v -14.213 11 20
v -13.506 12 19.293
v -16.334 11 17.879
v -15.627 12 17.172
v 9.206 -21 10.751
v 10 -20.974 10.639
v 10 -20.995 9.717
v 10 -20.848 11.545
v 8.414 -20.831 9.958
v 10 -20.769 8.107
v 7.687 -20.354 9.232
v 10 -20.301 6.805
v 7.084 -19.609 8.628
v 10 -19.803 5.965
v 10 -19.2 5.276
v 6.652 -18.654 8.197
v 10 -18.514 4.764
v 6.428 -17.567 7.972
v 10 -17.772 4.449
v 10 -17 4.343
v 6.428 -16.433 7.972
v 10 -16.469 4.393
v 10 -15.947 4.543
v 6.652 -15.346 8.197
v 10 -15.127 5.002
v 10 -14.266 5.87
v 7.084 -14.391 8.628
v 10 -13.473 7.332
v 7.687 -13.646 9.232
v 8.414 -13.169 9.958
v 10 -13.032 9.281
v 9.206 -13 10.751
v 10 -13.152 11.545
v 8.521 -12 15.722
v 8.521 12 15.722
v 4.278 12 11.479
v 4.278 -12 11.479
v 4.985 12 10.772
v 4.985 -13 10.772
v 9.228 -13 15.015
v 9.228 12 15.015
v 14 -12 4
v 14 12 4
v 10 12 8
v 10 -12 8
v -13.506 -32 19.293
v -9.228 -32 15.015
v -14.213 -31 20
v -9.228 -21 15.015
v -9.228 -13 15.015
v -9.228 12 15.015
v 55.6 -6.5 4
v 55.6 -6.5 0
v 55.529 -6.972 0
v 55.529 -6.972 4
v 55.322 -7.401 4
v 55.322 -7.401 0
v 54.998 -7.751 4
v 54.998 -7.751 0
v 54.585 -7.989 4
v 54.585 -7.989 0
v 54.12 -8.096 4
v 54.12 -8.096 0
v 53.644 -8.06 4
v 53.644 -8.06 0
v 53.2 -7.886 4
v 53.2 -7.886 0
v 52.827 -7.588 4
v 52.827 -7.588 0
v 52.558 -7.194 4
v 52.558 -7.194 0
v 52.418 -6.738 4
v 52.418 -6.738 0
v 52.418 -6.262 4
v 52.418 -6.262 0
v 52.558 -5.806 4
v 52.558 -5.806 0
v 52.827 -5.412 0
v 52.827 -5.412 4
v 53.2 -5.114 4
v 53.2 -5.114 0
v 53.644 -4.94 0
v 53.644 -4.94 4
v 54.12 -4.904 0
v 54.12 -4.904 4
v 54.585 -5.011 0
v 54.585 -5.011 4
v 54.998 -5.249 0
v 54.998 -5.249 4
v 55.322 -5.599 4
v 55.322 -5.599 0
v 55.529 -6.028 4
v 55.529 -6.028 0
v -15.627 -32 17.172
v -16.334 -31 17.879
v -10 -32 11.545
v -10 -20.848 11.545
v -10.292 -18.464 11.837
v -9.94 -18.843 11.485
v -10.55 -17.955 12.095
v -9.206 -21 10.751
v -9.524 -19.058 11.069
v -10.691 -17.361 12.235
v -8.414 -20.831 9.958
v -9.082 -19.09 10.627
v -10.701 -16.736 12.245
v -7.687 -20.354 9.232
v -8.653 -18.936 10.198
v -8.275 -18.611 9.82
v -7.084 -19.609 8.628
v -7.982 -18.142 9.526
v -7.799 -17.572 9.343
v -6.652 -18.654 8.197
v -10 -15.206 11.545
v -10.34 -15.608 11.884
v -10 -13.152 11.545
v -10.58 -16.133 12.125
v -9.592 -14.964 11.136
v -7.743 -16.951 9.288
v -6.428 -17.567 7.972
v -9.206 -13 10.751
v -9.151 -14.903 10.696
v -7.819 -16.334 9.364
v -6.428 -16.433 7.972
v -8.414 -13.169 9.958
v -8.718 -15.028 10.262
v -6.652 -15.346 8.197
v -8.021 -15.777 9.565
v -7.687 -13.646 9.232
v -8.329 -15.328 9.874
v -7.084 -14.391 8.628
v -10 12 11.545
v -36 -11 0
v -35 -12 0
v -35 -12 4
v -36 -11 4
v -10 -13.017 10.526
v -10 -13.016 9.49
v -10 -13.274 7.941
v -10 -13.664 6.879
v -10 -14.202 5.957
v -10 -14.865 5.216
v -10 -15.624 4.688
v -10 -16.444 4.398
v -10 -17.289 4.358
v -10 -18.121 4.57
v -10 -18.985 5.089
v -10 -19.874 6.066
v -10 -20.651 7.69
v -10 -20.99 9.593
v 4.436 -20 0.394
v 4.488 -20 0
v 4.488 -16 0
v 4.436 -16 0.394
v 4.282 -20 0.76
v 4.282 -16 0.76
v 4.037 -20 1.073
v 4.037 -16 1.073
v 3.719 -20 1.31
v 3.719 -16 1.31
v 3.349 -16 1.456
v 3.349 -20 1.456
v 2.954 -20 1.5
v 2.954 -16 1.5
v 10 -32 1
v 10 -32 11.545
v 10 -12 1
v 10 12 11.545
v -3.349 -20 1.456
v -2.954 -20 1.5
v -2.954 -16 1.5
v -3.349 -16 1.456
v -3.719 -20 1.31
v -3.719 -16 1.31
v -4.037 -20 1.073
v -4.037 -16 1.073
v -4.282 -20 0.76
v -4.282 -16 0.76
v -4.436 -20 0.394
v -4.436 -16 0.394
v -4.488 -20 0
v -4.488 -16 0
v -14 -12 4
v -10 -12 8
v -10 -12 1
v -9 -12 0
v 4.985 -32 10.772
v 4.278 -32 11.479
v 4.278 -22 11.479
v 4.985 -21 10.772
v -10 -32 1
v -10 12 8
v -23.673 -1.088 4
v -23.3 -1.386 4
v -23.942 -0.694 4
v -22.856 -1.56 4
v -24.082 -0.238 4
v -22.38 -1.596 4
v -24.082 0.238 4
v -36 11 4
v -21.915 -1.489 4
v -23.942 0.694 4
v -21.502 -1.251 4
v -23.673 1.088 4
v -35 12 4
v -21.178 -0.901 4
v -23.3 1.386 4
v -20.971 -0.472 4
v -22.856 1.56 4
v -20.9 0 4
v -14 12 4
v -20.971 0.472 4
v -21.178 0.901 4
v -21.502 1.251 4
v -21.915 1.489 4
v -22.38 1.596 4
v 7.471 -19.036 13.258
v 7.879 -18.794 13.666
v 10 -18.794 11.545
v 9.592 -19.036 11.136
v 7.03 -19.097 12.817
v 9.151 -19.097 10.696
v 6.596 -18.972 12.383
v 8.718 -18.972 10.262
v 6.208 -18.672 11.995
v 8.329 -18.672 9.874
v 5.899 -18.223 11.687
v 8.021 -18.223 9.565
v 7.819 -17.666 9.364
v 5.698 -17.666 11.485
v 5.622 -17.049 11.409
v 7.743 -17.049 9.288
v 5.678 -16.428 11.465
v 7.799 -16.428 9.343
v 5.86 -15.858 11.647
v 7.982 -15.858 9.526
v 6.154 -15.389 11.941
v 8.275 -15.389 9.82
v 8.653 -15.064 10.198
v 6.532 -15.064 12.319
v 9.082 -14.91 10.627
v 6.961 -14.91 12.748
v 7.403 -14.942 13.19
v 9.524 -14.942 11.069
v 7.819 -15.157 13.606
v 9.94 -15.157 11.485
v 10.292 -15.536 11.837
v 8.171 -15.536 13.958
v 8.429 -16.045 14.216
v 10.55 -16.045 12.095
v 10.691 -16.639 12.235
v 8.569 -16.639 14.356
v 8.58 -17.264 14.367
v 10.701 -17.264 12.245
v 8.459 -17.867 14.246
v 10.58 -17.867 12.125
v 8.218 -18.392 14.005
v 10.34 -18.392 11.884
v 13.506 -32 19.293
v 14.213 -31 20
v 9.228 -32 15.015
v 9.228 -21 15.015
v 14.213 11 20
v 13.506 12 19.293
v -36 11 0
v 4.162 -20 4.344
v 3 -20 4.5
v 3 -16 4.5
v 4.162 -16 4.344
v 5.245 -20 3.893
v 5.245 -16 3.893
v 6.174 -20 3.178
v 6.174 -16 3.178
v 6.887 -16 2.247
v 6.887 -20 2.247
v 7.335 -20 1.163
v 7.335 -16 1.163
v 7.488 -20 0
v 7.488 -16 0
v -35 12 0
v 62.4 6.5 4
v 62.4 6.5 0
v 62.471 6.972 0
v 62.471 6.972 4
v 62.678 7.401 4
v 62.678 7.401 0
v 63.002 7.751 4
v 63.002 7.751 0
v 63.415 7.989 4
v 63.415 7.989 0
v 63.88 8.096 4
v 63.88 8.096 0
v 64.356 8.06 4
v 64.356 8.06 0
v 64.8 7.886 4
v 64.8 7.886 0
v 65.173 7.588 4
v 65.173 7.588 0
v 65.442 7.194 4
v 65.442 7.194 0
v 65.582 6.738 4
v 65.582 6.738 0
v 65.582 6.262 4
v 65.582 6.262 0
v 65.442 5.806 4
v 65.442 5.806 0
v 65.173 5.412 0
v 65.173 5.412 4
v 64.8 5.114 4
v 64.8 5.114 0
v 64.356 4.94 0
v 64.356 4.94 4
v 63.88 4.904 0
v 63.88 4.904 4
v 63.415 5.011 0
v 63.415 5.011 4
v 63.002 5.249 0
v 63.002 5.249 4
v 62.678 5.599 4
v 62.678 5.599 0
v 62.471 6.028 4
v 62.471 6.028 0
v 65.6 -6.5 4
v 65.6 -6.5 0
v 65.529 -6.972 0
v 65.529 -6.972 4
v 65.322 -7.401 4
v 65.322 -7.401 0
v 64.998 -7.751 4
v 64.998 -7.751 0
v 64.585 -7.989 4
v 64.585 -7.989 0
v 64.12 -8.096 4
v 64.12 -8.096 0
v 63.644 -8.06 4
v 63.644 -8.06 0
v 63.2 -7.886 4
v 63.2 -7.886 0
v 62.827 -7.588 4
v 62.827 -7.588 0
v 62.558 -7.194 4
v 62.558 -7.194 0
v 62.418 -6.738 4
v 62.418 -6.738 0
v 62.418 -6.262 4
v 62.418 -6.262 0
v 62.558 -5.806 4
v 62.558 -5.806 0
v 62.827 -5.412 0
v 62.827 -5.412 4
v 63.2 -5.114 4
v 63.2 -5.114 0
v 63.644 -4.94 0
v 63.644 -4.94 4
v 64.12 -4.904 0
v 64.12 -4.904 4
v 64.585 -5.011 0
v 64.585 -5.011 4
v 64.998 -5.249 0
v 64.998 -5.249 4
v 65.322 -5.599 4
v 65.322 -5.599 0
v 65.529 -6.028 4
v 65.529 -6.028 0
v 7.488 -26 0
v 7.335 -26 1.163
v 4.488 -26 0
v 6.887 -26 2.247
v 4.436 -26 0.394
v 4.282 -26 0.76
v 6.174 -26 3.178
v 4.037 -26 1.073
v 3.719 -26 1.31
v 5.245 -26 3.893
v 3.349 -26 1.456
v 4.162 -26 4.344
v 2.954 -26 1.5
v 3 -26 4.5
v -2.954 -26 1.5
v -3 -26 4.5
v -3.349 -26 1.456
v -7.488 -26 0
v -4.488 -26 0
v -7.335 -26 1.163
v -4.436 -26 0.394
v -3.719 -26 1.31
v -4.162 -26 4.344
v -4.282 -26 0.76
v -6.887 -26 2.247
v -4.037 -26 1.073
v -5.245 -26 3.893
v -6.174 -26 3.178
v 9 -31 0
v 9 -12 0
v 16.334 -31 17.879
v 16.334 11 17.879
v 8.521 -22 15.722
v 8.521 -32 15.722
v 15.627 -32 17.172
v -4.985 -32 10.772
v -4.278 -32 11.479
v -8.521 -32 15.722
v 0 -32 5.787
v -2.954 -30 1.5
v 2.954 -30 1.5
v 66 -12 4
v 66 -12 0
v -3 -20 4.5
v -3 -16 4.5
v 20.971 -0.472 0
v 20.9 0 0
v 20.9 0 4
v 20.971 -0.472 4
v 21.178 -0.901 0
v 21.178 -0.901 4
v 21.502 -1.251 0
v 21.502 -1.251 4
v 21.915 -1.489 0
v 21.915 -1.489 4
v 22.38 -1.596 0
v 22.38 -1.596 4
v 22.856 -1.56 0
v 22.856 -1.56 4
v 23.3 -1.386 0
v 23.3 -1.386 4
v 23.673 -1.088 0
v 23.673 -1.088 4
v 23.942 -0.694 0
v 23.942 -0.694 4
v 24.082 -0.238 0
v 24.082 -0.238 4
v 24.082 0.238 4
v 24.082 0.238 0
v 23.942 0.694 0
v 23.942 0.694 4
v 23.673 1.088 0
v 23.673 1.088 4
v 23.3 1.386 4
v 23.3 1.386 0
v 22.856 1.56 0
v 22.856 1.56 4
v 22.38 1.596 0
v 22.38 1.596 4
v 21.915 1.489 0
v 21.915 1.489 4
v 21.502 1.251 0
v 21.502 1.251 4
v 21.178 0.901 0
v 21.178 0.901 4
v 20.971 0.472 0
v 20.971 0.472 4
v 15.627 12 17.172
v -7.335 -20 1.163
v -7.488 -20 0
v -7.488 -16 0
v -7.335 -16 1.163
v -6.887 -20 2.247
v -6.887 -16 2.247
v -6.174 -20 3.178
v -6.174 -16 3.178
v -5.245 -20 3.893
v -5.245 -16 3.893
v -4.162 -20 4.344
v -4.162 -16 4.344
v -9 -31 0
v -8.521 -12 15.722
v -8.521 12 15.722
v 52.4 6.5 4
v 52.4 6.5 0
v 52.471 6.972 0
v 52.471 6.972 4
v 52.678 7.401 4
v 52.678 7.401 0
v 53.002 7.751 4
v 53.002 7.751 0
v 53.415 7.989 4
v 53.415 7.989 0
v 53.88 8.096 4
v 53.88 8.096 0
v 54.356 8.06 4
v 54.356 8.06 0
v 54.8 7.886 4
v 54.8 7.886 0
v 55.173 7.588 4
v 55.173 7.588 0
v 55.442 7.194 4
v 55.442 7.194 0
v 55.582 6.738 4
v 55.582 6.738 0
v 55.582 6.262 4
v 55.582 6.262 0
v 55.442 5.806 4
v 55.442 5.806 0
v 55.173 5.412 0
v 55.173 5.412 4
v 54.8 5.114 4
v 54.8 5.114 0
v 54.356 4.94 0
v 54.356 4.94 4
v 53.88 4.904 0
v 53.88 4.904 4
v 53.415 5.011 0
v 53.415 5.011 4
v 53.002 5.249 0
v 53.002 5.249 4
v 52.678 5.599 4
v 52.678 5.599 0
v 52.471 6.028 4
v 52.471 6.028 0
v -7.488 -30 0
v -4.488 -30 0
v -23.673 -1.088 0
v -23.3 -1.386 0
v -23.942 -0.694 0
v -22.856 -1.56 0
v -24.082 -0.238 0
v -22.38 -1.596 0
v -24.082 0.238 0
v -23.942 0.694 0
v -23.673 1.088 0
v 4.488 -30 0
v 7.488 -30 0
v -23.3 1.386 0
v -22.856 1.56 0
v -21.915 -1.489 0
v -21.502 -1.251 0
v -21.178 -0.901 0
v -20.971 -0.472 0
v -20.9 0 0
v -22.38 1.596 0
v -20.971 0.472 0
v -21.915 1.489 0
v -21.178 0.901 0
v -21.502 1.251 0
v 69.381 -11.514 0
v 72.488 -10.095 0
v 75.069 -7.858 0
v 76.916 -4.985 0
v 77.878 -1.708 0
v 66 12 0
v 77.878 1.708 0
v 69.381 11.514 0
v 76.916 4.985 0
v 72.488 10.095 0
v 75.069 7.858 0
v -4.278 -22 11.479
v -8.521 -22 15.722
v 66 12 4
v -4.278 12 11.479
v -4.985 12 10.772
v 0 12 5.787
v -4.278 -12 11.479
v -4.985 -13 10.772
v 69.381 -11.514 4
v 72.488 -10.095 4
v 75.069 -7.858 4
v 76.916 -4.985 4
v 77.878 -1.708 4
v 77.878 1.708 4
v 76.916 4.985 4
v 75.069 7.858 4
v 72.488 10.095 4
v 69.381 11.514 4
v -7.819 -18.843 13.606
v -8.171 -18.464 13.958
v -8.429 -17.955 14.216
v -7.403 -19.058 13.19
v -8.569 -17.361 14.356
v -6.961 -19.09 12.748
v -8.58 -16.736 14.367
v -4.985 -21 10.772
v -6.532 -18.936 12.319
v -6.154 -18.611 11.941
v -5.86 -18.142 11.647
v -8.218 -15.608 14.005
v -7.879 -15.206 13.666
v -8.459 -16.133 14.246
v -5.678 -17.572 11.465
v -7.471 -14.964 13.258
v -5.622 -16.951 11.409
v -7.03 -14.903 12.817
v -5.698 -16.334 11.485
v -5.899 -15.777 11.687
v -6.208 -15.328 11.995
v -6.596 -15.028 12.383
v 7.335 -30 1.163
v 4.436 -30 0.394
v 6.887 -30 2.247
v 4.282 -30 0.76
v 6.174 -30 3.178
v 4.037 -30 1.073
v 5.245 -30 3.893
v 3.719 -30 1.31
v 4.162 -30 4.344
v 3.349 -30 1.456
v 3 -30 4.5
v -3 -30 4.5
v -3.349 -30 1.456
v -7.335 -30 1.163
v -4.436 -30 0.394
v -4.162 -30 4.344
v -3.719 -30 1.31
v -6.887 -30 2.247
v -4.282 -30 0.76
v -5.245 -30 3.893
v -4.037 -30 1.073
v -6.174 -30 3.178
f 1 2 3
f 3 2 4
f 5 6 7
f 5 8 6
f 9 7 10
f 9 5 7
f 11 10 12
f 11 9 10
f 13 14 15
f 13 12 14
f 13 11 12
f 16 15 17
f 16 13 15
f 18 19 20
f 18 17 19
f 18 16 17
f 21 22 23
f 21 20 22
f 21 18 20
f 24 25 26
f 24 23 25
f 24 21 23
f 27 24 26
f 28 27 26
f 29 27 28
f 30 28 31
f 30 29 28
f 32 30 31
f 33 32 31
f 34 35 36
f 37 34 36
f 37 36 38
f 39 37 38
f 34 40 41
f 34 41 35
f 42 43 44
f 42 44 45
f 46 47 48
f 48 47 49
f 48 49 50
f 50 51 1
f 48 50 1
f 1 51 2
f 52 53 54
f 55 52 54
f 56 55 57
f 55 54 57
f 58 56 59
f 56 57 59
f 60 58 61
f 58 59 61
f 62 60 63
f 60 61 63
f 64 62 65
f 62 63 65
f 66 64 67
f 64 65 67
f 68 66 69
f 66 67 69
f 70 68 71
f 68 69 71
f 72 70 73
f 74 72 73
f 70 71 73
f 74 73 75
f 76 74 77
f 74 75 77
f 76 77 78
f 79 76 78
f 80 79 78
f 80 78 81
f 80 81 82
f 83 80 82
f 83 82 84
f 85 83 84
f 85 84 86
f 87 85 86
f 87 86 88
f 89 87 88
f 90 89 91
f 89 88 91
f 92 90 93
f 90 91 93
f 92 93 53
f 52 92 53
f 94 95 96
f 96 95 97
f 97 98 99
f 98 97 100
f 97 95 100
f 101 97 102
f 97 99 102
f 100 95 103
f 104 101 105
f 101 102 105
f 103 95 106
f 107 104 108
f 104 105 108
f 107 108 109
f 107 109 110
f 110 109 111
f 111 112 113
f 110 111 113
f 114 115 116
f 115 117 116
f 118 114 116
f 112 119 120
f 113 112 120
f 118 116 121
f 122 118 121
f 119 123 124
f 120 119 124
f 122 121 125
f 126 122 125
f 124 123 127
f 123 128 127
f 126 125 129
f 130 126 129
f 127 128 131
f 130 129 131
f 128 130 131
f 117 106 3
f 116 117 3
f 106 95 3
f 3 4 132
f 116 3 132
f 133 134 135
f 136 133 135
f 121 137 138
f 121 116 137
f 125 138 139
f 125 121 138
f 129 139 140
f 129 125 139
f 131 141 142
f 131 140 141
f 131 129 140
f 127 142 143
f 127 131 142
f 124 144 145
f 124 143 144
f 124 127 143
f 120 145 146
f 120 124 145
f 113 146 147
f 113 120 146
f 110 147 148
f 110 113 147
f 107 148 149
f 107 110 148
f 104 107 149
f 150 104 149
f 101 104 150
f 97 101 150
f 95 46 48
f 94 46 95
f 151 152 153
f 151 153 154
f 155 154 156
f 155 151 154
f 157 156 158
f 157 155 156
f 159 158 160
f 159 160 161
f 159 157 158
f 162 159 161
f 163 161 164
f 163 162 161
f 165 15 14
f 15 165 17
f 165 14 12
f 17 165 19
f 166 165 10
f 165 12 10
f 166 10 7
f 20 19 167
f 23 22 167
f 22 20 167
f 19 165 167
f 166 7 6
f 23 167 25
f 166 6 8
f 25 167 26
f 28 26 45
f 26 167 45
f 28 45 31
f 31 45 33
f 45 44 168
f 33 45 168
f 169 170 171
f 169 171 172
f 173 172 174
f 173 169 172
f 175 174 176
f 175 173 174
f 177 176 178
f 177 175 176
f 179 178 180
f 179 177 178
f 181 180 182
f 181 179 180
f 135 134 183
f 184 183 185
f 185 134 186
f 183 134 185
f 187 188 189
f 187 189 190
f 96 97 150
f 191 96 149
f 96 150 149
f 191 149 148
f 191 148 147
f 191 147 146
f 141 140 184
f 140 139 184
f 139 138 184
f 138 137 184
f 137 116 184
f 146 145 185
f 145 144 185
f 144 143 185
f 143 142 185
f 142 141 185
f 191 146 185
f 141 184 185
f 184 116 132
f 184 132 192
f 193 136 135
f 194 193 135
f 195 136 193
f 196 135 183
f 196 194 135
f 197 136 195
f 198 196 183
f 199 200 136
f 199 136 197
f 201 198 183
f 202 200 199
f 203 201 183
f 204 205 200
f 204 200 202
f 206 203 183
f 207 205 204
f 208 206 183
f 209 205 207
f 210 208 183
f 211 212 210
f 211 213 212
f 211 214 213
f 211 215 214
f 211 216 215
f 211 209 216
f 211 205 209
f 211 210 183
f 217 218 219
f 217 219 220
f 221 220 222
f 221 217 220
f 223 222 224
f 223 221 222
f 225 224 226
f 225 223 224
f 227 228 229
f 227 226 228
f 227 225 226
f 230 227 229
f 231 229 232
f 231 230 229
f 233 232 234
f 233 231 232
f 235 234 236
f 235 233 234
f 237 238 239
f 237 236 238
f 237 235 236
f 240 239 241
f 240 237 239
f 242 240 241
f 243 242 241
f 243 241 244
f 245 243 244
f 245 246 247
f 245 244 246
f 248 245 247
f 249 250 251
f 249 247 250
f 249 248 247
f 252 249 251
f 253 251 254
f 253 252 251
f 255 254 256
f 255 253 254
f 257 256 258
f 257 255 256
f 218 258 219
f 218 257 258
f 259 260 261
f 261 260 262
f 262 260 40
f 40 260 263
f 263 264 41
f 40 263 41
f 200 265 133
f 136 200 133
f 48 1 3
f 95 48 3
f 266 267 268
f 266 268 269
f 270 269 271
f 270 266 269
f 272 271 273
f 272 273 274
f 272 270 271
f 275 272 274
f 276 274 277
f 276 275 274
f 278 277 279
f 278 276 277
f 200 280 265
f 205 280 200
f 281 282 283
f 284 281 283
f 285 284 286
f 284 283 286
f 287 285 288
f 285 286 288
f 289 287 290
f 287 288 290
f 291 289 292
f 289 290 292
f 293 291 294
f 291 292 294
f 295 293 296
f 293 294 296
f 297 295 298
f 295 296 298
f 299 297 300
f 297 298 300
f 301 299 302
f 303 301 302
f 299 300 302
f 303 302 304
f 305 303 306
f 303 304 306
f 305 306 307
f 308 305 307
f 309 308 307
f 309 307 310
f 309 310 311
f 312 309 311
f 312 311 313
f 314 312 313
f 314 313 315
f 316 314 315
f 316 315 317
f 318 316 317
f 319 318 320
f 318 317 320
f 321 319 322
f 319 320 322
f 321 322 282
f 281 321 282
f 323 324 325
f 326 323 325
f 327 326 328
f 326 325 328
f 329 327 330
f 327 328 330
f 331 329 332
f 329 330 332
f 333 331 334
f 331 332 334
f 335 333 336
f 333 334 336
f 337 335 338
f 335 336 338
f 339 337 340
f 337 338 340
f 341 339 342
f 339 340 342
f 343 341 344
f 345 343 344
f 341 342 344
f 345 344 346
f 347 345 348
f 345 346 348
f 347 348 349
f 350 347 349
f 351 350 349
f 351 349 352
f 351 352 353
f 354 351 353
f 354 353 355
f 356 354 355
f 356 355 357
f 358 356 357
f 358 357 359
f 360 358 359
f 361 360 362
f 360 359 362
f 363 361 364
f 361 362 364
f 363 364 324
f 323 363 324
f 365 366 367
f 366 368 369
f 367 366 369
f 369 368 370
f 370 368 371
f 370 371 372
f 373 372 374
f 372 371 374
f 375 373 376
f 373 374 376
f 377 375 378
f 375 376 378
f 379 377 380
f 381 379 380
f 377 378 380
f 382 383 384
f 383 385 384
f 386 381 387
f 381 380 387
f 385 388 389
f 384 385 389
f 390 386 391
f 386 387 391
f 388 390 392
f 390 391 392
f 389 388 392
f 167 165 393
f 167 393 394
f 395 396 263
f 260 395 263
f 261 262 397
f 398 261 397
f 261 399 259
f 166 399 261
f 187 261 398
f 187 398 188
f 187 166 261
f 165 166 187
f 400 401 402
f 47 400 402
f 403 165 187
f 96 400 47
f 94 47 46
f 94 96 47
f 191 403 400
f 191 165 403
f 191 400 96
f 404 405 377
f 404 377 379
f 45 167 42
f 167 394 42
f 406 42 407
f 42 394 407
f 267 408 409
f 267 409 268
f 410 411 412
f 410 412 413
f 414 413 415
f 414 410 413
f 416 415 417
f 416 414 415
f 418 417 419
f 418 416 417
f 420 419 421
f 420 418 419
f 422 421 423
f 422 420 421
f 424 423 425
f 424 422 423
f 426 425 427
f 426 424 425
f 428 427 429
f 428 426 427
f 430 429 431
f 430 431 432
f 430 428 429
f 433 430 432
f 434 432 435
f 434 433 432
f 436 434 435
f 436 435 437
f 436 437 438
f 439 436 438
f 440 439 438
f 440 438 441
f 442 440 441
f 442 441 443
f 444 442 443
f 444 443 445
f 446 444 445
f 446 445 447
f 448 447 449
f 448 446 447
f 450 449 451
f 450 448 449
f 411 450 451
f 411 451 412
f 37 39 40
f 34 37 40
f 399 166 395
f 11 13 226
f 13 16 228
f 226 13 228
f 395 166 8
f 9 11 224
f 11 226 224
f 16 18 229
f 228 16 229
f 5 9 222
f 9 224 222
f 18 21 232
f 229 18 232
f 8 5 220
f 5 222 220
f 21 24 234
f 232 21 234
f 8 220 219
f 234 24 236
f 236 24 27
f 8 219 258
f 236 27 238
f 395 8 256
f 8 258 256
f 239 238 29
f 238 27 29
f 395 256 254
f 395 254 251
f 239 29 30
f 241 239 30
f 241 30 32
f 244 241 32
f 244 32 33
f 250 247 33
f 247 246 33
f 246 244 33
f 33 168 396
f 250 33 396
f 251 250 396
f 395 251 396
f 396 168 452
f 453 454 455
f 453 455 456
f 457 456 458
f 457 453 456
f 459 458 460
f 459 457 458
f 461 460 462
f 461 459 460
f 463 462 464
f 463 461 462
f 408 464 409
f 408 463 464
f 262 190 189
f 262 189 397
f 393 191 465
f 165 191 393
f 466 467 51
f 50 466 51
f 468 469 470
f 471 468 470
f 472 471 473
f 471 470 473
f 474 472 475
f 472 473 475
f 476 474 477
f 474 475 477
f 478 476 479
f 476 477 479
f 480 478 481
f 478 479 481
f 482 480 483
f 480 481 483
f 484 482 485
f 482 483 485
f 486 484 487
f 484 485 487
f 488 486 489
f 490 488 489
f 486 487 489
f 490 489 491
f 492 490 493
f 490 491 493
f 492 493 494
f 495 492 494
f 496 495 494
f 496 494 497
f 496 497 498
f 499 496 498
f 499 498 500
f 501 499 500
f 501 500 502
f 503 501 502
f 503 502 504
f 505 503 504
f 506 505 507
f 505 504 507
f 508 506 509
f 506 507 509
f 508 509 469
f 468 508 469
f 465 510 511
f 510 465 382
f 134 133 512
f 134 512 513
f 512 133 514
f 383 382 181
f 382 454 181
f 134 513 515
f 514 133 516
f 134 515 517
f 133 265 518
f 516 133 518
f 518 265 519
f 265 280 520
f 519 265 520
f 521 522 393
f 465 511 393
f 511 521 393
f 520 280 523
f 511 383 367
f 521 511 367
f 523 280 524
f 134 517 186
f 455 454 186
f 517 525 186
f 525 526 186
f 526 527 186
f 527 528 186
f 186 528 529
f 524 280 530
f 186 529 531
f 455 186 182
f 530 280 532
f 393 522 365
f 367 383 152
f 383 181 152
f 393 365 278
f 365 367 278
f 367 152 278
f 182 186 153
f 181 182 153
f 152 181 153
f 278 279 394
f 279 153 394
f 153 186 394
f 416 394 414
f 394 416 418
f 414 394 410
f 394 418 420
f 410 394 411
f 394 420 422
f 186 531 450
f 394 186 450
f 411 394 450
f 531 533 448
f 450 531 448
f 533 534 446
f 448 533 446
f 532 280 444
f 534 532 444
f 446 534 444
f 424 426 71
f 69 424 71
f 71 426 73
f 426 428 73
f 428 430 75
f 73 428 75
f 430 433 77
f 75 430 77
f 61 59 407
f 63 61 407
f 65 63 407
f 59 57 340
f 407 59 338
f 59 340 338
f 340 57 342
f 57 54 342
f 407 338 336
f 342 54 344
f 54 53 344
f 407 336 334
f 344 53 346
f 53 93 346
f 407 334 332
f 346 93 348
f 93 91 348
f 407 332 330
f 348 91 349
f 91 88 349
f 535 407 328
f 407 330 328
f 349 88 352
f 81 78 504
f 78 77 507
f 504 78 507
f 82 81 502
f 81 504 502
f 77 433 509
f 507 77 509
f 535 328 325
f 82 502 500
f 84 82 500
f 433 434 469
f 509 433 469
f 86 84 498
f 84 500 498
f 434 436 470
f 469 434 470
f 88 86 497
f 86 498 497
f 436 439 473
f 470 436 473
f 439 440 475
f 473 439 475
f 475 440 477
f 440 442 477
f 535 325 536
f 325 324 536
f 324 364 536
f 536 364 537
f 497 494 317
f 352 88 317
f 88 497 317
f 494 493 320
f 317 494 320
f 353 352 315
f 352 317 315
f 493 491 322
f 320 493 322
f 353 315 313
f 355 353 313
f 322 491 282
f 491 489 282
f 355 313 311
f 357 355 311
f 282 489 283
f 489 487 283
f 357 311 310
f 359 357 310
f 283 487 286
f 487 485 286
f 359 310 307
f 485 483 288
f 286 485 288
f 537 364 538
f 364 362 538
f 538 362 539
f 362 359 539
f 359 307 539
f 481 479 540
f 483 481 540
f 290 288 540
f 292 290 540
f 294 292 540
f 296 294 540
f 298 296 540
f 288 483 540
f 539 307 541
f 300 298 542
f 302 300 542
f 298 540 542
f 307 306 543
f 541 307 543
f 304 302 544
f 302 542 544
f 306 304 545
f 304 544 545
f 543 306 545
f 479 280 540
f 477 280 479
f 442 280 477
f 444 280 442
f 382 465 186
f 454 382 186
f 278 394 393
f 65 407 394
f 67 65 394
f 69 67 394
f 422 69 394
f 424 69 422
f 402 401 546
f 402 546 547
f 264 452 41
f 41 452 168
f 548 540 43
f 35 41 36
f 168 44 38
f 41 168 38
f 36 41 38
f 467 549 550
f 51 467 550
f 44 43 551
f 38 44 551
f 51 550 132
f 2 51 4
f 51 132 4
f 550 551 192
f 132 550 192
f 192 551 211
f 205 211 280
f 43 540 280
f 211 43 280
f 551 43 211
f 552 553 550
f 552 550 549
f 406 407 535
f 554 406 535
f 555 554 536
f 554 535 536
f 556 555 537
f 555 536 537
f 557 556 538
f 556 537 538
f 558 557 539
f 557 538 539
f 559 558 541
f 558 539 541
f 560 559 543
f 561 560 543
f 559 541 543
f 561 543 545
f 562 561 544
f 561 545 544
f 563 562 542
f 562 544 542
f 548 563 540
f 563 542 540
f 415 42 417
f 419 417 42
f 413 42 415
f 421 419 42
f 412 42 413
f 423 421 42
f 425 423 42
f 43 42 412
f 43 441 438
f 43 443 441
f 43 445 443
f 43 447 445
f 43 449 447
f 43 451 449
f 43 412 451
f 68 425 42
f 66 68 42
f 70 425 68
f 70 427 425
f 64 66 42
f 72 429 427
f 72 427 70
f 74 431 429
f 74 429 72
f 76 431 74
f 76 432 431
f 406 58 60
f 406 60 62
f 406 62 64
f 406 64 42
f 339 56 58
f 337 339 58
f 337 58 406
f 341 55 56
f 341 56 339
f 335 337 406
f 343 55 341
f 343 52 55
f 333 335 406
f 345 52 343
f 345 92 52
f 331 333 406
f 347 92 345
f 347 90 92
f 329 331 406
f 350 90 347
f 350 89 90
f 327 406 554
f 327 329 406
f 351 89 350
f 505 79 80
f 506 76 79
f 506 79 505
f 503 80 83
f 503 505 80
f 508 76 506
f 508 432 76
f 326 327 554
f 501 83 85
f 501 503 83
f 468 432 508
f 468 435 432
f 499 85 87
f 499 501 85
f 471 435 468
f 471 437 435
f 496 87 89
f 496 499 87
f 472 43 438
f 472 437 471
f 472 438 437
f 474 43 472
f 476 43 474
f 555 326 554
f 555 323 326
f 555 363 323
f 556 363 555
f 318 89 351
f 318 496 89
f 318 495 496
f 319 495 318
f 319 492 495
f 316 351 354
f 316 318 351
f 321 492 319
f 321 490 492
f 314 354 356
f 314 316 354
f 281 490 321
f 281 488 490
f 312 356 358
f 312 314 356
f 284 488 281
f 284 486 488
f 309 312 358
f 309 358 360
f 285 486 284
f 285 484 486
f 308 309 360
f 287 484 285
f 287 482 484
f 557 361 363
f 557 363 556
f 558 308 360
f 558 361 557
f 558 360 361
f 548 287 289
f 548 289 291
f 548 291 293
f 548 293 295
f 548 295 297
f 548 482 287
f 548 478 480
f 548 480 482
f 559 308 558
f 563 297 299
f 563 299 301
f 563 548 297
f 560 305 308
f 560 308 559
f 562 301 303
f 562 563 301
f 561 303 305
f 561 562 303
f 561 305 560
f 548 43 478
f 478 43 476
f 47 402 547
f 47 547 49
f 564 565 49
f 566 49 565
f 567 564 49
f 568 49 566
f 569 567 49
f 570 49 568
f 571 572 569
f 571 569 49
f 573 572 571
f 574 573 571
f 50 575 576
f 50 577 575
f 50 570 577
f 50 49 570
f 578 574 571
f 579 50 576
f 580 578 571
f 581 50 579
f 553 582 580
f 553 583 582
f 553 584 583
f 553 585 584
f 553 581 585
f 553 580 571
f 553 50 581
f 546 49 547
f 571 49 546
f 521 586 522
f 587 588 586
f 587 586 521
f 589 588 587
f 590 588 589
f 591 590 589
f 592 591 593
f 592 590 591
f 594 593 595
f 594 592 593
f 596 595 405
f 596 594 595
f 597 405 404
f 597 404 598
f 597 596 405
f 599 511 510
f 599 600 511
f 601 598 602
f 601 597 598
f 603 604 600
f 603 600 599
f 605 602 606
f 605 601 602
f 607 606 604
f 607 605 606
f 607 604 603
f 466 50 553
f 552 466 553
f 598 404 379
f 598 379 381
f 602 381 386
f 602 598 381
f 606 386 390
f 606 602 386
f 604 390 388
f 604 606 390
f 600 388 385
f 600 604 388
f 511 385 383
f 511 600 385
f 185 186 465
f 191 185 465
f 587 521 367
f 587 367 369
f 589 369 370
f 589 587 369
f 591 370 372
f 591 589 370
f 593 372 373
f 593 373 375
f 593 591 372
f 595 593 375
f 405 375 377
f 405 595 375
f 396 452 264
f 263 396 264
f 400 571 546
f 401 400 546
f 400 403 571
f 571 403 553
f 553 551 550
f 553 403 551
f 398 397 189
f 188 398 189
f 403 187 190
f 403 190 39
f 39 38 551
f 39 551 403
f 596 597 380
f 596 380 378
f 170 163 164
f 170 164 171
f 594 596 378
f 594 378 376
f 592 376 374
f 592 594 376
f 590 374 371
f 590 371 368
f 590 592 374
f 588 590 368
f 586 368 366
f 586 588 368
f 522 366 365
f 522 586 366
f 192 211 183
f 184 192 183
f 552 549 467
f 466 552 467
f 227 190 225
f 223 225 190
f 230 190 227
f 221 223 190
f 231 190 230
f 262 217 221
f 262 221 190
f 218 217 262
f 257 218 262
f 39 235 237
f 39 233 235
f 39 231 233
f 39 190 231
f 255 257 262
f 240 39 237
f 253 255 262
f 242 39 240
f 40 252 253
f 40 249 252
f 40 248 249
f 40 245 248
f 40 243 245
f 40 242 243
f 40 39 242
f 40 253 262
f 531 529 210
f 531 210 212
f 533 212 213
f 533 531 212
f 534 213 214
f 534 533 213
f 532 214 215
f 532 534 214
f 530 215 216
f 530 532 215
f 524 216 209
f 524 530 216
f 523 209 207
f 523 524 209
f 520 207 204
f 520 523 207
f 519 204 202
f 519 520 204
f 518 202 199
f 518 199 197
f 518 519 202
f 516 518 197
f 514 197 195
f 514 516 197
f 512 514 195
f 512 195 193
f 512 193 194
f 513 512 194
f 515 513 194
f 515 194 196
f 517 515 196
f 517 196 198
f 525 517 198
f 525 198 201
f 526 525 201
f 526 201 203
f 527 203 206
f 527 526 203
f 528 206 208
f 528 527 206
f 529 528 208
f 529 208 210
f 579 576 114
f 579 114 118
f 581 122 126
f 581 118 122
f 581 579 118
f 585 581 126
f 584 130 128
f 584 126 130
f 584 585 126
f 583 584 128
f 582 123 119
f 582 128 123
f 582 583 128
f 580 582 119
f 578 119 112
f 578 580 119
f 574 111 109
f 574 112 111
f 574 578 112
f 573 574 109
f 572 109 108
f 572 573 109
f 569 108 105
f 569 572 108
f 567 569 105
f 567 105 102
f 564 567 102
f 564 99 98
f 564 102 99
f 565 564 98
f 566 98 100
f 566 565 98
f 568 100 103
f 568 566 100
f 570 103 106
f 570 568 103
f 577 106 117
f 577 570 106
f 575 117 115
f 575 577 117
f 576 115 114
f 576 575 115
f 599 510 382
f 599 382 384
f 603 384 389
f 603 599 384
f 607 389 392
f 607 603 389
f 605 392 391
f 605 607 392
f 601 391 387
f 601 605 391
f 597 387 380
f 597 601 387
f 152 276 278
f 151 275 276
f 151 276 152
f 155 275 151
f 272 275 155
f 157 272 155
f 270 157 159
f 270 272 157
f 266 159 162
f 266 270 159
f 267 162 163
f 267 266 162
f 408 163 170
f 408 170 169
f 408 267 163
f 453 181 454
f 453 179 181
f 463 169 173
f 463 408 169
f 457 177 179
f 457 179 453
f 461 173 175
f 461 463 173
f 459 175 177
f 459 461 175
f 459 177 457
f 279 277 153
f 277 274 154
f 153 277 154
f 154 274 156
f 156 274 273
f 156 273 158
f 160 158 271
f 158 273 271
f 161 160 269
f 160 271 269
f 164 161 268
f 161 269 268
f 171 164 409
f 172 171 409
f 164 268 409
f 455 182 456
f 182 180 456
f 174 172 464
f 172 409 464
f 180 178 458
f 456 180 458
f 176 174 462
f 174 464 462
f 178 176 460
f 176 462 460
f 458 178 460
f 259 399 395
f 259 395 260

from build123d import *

# Parameters (mm, degrees)
CROQUIS1_R                 = 1.6
SALIENTE_EXTRUIR1_DEPTH    = 4
CROQUIS3_R                 = 1.6
SALIENTE_EXTRUIR3_DEPTH    = 4
SALIENTE_EXTRUIR4_DEPTH    = 44
CORTAR_EXTRUIR1_START      = -2
CORTAR_EXTRUIR1_DEPTH      = 4
MATRIZL1_COUNT             = 2
MATRIZL1_PITCH             = 10
CORTAR_EXTRUIR2_DEPTH      = 86.777797157
CORTAR_EXTRUIR2_DEPTH_BACK = 86.777797157
CROQUIS7_R                 = 2.1
CROQUIS8_R                 = 4
CORTAR_EXTRUIR3_DEPTH      = 86.777797157
CORTAR_EXTRUIR4_DEPTH      = 88.170949948
CORTAR_EXTRUIR4_DEPTH_BACK = 88.170949948
CROQUIS9_R                 = 2.1
CROQUIS10_R                = 4
CORTAR_EXTRUIR5_DEPTH      = 88.170949948
CHAFL_N1_SIZE              = 4
CHAFL_N2_SIZE              = 1
CROQUIS11_W                = 6
CROQUIS11_H                = 8
CORTAR_EXTRUIR6_DEPTH      = 1
CROQUIS12_W                = 6
CROQUIS12_H                = 8
CORTAR_EXTRUIR7_DEPTH      = 1
CHAFL_N3_SIZE              = 1


with BuildPart() as part:
    # Croquis1 → Saliente-Extruir1 (new body)
    with BuildSketch(Plane.XY):
        Polygon((10, -12), (36, -12), (36, 12), (-36, 12), (-36, -12), (-10, -12), (-10, -32), (10, -32), align=None)
        with Locations((-22.5, 0)):
            Circle(CROQUIS1_R, mode=Mode.SUBTRACT)
        with Locations(Location((22.5, 0, 0), (0, 0, 180))):
            Circle(CROQUIS1_R, mode=Mode.SUBTRACT)
    extrude(amount=SALIENTE_EXTRUIR1_DEPTH)

    # Croquis3 → Saliente-Extruir3 (add)
    with BuildSketch(Plane(origin=(0, 0, 0), x_dir=(-1, 0, 0), z_dir=(0, 0, -1))):
        with BuildLine():
            Line((-66, 12), (-36, 12))
            Line((-36, 12), (-36, -12))
            Line((-36, -12), (-66, -12))
            ThreePointArc((-66, -12), (-78, 0), (-66, 12))
        make_face()
        with Locations((-54, 6.5)):
            Circle(CROQUIS3_R, mode=Mode.SUBTRACT)
        with Locations((-64, 6.5)):
            Circle(CROQUIS3_R, mode=Mode.SUBTRACT)
        with Locations(Location((-54, -6.5, 0), (0, 0, 180))):
            Circle(CROQUIS3_R, mode=Mode.SUBTRACT)
        with Locations(Location((-64, -6.5, 0), (0, 0, 180))):
            Circle(CROQUIS3_R, mode=Mode.SUBTRACT)
    extrude(amount=-SALIENTE_EXTRUIR3_DEPTH)

    # Croquis5 → Saliente-Extruir4 (add, through all)
    with BuildSketch(Plane(origin=(0, 12, 0), x_dir=(1, 0, 0), z_dir=(0, 1, 0))):
        Polygon((-10, -11.544513011), (-10, -4), (10, -4), (10, -11.544513011), (16.334166645, -17.878679656), (14.212846302, -20), (9.227743494, -15.014897193), (8.520636713, -15.722003974), (4.277996026, -11.479363287), (4.985102807, -10.772256506), (0, -5.787153698), (-4.985102807, -10.772256506), (-4.277996026, -11.479363287), (-8.520636713, -15.722003974), (-9.227743494, -15.014897193), (-14.212846302, -20), (-16.334166645, -17.878679656), align=None)
    extrude(amount=-SALIENTE_EXTRUIR4_DEPTH)

    # Croquis6 → Cortar-Extruir1 (cut)
    with BuildSketch(Plane.XZ.offset(32).offset(CORTAR_EXTRUIR1_START)):
        with BuildLine():
            Line((-4.48819847, 0), (-7.48819847, 0))
            ThreePointArc((-7.48819847, 0), (-6.174348725, 3.177805305), (-3, 4.499984525))
            Line((-3, 4.499984525), (3, 4.499984525))
            ThreePointArc((3, 4.499984525), (6.174348725, 3.177805305), (7.48819847, 0))
            Line((7.48819847, 0), (4.48819847, 0))
            ThreePointArc((4.48819847, 0), (4.036842813, 1.072541394), (2.954405081, 1.499619287))
            Line((2.954405081, 1.499619287), (-2.954405081, 1.499619287))
            ThreePointArc((-2.954405081, 1.499619287), (-4.036842813, 1.072541394), (-4.48819847, 0))
        make_face()
    cortar_extruir1 = extrude(amount=-CORTAR_EXTRUIR1_DEPTH, mode=Mode.SUBTRACT)

    # MatrizL1: Cortar-Extruir1 ×2
    with Locations(*[(0, i * MATRIZL1_PITCH, 0) for i in range(1, MATRIZL1_COUNT)]):
        add(cortar_extruir1, mode=Mode.SUBTRACT)

    # Croquis7 → Cortar-Extruir2 (cut, two sides: drawn at the far end of the back side and taken through both)
    with BuildSketch(Plane(origin=(0.772256506, 0, 0.772256506), x_dir=(-0.7071067811865476, 0, 0.7071067811865476), z_dir=(-0.7071067811865476, 0, -0.7071067811865476)).offset(-CORTAR_EXTRUIR2_DEPTH_BACK)):
        with Locations(Location((14.142135624, -17, 0), (0, 0, 58.663416321))):
            Circle(CROQUIS7_R)
    extrude(amount=CORTAR_EXTRUIR2_DEPTH + CORTAR_EXTRUIR2_DEPTH_BACK, mode=Mode.SUBTRACT)

    # Croquis8 → Cortar-Extruir3 (cut, through all)
    with BuildSketch(Plane(origin=(0.772256506, 0, 0.772256506), x_dir=(-0.7071067811865476, 0, 0.7071067811865476), z_dir=(-0.7071067811865476, 0, -0.7071067811865476))):
        with Locations((14.142135624, -17)):
            Circle(CROQUIS8_R)
    extrude(amount=CORTAR_EXTRUIR3_DEPTH, mode=Mode.SUBTRACT)

    # Croquis9 → Cortar-Extruir4 (cut, two sides: drawn at the far end of the back side and taken through both)
    with BuildSketch(Plane(origin=(-0.772256506, 0, 0.772256506), x_dir=(-0.7071067811865476, 0, -0.7071067811865476), z_dir=(0.7071067811865476, 0, -0.7071067811865476)).offset(-CORTAR_EXTRUIR4_DEPTH_BACK)):
        with Locations(Location((-14.142135624, -17, 0), (0, 0, 238.663416321))):
            Circle(CROQUIS9_R)
    extrude(amount=CORTAR_EXTRUIR4_DEPTH + CORTAR_EXTRUIR4_DEPTH_BACK, mode=Mode.SUBTRACT)

    # Croquis10 → Cortar-Extruir5 (cut, through all)
    with BuildSketch(Plane(origin=(-0.772256506, 0, 0.772256506), x_dir=(-0.7071067811865476, 0, -0.7071067811865476), z_dir=(0.7071067811865476, 0, -0.7071067811865476))):
        with Locations((-14.142135624, -17)):
            Circle(CROQUIS10_R)
    extrude(amount=CORTAR_EXTRUIR5_DEPTH, mode=Mode.SUBTRACT)

    # Chaflán1
    chafl_n1_edges = [part.edges().sort_by_distance(p)[0] for p in [
        (-10, 0, 4),
        (10, 0, 4),
    ]]
    chamfer(chafl_n1_edges, length=CHAFL_N1_SIZE)

    # Chaflán2
    chafl_n2_edges = [part.edges().sort_by_distance(p)[0] for p in [
        (-36, -12, 2),
        (-36, 12, 2),
        (-15.273506474, -32, 18.939339828),
        (15.273506474, -32, 18.939339828),
        (15.273506474, 12, 18.939339828),
        (-15.273506474, 12, 18.939339828),
        (10, -22, 0),
        (0, -32, 0),
        (-10, -22, 0),
    ]]
    chamfer(chafl_n2_edges, length=CHAFL_N2_SIZE)

    # Croquis11 → Cortar-Extruir6 (cut)
    with BuildSketch(Plane(origin=(-3.60068363, 0, 3.60068363), x_dir=(0.7071067811865476, 0, 0.7071067811865476), z_dir=(-0.7071067811865476, 0, 0.7071067811865476))):
        with Locations((14.142135624, -17)):
            Rectangle(CROQUIS11_W, CROQUIS11_H)
    extrude(amount=-CORTAR_EXTRUIR6_DEPTH, mode=Mode.SUBTRACT)

    # Croquis12 → Cortar-Extruir7 (cut)
    with BuildSketch(Plane(origin=(3.60068363, 0, 3.60068363), x_dir=(0.7071067811865475, 0, -0.7071067811865477), z_dir=(0.7071067811865477, 0, 0.7071067811865475))):
        with Locations((-14.142135624, -17)):
            Rectangle(CROQUIS12_W, CROQUIS12_H)
    extrude(amount=-CORTAR_EXTRUIR7_DEPTH, mode=Mode.SUBTRACT)

    # Chaflán3
    chafl_n3_edges = [part.edges().sort_by_distance(p)[0] for p in [
        (-6.39931637, -21, 13.60068363),
        (6.39931637, -21, 13.60068363),
        (6.39931637, -13, 13.60068363),
        (-6.39931637, -13, 13.60068363),
    ]]
    chamfer(chafl_n3_edges, length=CHAFL_N3_SIZE - 0.0001)  # a hair under: the kernel refuses the full size


solid = part.part
